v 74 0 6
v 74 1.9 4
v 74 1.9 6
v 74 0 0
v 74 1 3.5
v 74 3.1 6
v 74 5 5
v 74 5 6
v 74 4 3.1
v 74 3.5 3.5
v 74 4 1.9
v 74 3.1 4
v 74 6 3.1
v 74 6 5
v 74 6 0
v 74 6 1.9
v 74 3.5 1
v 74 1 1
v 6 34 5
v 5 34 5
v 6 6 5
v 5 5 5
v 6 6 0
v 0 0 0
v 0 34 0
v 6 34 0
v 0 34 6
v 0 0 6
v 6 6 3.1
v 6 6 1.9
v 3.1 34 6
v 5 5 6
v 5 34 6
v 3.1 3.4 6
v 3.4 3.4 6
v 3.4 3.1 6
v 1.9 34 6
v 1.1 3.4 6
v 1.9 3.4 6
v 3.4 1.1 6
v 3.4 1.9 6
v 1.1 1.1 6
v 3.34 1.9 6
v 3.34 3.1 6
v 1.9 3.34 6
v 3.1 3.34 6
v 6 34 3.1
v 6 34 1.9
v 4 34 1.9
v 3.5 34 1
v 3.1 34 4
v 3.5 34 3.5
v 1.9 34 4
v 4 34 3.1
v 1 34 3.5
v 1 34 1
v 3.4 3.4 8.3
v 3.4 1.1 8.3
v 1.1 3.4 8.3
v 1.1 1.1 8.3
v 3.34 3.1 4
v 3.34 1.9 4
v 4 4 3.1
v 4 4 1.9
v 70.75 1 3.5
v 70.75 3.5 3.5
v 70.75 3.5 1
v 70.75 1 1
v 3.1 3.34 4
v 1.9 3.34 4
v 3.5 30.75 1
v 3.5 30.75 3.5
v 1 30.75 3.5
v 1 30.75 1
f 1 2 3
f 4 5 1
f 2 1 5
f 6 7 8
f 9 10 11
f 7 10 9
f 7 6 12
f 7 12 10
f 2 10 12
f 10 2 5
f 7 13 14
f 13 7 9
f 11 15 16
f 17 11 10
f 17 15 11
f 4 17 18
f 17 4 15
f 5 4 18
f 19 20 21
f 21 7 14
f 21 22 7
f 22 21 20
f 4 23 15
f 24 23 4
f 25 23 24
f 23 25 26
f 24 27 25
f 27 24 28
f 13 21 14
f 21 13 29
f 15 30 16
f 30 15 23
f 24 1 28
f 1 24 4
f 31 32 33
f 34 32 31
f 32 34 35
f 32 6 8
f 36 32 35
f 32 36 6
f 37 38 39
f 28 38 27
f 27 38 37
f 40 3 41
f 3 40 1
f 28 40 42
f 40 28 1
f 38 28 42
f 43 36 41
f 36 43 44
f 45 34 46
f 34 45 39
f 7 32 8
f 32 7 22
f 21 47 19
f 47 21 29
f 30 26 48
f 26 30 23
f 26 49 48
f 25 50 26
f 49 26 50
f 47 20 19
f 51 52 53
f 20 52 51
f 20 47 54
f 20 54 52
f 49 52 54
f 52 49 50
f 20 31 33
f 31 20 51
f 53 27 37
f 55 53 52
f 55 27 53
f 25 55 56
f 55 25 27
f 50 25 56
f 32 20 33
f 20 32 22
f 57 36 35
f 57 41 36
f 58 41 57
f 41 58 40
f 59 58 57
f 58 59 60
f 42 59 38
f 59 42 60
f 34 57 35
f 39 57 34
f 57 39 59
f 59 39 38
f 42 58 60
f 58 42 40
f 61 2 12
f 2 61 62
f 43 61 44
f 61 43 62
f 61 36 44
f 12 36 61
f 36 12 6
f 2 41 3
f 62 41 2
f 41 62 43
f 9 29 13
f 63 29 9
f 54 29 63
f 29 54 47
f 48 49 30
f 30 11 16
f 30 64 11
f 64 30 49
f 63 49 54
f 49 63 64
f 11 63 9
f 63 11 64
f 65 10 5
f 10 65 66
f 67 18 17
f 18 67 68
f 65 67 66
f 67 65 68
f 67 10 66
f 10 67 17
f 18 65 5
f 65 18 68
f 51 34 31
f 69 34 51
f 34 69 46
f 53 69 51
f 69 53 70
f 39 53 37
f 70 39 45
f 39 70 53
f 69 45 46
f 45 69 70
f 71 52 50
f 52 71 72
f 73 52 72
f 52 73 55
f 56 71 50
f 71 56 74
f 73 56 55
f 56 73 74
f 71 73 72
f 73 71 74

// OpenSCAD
//—————————————————————————
//►►► define overall box dimensions ◄◄◄
  box_length = 80;  //total box length
  box_width = 60;   //total box width
  box_height = 40;  //total box height including rim
  cornerL_cross_section = 6; //cross section of corner pcs
  rim_thickness = 6; //thickness (height) of top rim (slot_depth+1 minimum)
//—————————————————————————  
  slot_depth = 2.0;  //be careful changing this (2)
  slot_width = 1.2;  //and this... (1.2)
  slot_width_clearance = .4;  //and this... (.4)
  //panel thickness = slot_width - slot_width_clearance
//—————————————————————————
  feet = 2;  //  2=feet  0=no feet
//feet under larger size bottom panels for support. a larger sized bottom panel will "droop" & possibly come out of the slots if loaded down & unsupported.
//—————————————————————————
//▬▬► NOTES & TIPS AT THE END OF FILE ◄▬▬
//—————————————————————————
//changing these below may adversely affect the fit of various parts...
  clearance1 = .2;   //pin hole
  clearance2 = .75;  //extra pin hole depth clearance
  clearance3 = .1;   //slot depth clearance (each side)
//—————————————————————————

//—————————————————————————
//▼▼↓↓↓ choose part to render ↓↓↓▼▼

//  "cornerL_LxH"      need 2 pcs
//  "cornerL_WxH"      need 2 pcs
//  "top_rim"          need 1 pc
//  "panel_side_LxH"   need 2 pcs
//  "panel_side_WxH"   need 2 pcs
//  "panel_bottom"     need 1 pc

//▲▲↑↑↑ choose part to render ↑↑↑▲▲

//▼▼▼▼▼▼▼▼▼▼▼▼▼▼▼▼▼▼▼▼▼▼▼
  part = "cornerL_LxH";  //◄◄◄ change this ◄◄◄
//▲▲▲▲▲▲▲▲▲▲▲▲▲▲▲▲▲▲▲▲▲▲▲


//—————————————————————————
  square_pin_hole = 2.5;  //cubed (don't change)
  pin_offset = 1.0;  //pin offset from corner (don't change)
//—————————————————————————
  cLcross = cornerL_cross_section;
  cornerL_L = box_length - cLcross;
  cornerL_W = box_width - cLcross;
  cornerL_H = box_height - rim_thickness;
  pin_size = square_pin_hole - clearance1;
  pin_hole_depth = square_pin_hole + clearance2;
  slot_length_L = cornerL_L - cLcross + slot_depth*2;
  slot_length_W = cornerL_W - cLcross + slot_depth*2;
  slot_length_H = cornerL_H - cLcross + slot_depth*2;
  slot_length_rim_L = box_length - pin_size*2 - pin_offset*2;
  slot_length_rim_W = box_width - pin_size*2 - pin_offset*2;
  panel_length = box_length - cLcross*2 + slot_depth*2 - clearance3*2;
  panel_width = box_width - cLcross*2 + slot_depth*2 - clearance3*2;
  panel_height = box_height - cLcross - rim_thickness + slot_depth*2 - clearance3*2;
  extra_length = cLcross*.22;  //rim slot extra length
//—————————————————————————
     
     
//—↓—↓—↓— dont change these —↓—↓—↓—
if(part == "cornerL_LxH") {//  ←↓dont change these
    cornerL_LxH();//  ←↓↑dont change these
} else if(part == "cornerL_WxH") {
    cornerL_WxH();//  ←↓↑dont change
} else if(part == "top_rim") {
    top_rim();//  ←↓↑dont change
} else if(part == "panel_side_LxH") {
    panel_side_LxH();//  ←↓↑dont change
} else if(part == "panel_side_WxH") {
    panel_side_WxH();//  ←↓↑dont change
} else if(part == "panel_bottom") {
    panel_bottom();//  ←↑dont change
}//—↑—↑—↑— dont change these —↑—↑—↑—



//—————————————————————————      
//————corner L length & height————
module cornerL_LxH(){
difference(){
union(){
//box length lower (along X axis)
translate([0,0,0])
   rotate([0,0,0])
      color("MediumPurple") 
         cube([cornerL_L,cLcross,5]);
//box length upper (along X axis)
translate([0,0,0])
   rotate([0,0,0])
      color("MediumPurple") 
         cube([cornerL_L,5,cLcross]);
//box height lower (along Y axis)
translate([0,0,0])
   rotate([0,0,0])
      color("MediumPurple") 
         cube([cLcross,cornerL_H,5]);
//box height upper (along Y axis)
translate([0,0,0])
   rotate([0,0,0])
      color("MediumPurple") 
         cube([5,cornerL_H,cLcross]);
//square pin
translate([pin_offset+clearance1/2,pin_offset+clearance1/2,cLcross])
   rotate([0,0,0])
      color("DarkOrchid") 
         cube([pin_size,pin_size,pin_size]);
}        
//top slot for length (along X axis)
translate([cLcross-slot_depth-extra_length/2,5/2-slot_width/2,cLcross-slot_depth])
   rotate([0,0,0])
      color("Yellow") 
         cube([slot_length_L,slot_width,slot_depth]);
//side slot for length (along X axis)
translate([cLcross-slot_depth,cLcross-slot_depth,5/2-slot_width/2])
   rotate([0,0,0])
      color("Yellow") 
         cube([slot_length_L,slot_depth,slot_width]);
//square pin hole for length end (along X axis)
translate([cornerL_L-square_pin_hole-clearance2,pin_offset,pin_offset])
   rotate([0,0,0])
      color("Goldenrod") 
         cube([pin_hole_depth,square_pin_hole,square_pin_hole]);
//top slot for height (along Y axis)
translate([5/2-slot_width/2,cLcross-slot_depth-extra_length/2,cLcross-slot_depth])
   rotate([0,0,0])
      color("Yellow") 
         cube([slot_width,slot_length_H,slot_depth]);
//side slot for height (along Y axis)
translate([cLcross-slot_depth,cLcross-slot_depth,5/2-slot_width/2])
   rotate([0,0,0])
      color("Yellow") 
         cube([slot_depth,slot_length_H,slot_width]);
//square pin hole for height end (along Y axis)
translate([pin_offset,cornerL_H-square_pin_hole-clearance2,pin_offset])
   rotate([0,0,0])
      color("Goldenrod") 
         cube([square_pin_hole,pin_hole_depth,square_pin_hole]);
     }}
     
    
     
//—————————————————————————
//————corner L width & height————
module cornerL_WxH(){
difference(){
union(){
//box width lower (along X axis)
translate([0,0,0])
   rotate([0,0,0])
      color("Plum") 
         cube([cornerL_W,cLcross,5]);
//box width upper (along X axis)
translate([0,0,0])
   rotate([0,0,0])
      color("Plum") 
         cube([cornerL_W,5,cLcross]);
//box height lower (along Y axis)
translate([0,0,0])
   rotate([0,0,0])
      color("Plum") 
         cube([cLcross,cornerL_H,5]);
//box height upper (along Y axis)
translate([0,0,0])
   rotate([0,0,0])
      color("Plum") 
         cube([5,cornerL_H,cLcross]);
//square pin
translate([pin_offset+clearance1/2,pin_offset+clearance1/2,cLcross])
   rotate([0,0,0])
      color("Orchid") 
         cube([pin_size,pin_size,pin_size]);
}     
//top slot for width (along X axis)
translate([cLcross-slot_depth-extra_length/2,5/2-slot_width/2,cLcross-slot_depth])
   rotate([0,0,0])
      color("Yellow") 
         cube([slot_length_W,slot_width,slot_depth]);
//side slot for width (along X axis)
translate([cLcross-slot_depth,cLcross-slot_depth,5/2-slot_width/2])
   rotate([0,0,0])
      color("Yellow") 
         cube([slot_length_W,slot_depth,slot_width]);
 //square pin hole for width end (along X axis)
translate([cornerL_W-square_pin_hole-clearance2,pin_offset,pin_offset])
   rotate([0,0,0])
      color("Goldenrod") 
         cube([pin_hole_depth,square_pin_hole,square_pin_hole]);
//top slot for height (along Y axis)
translate([5/2-slot_width/2,cLcross-slot_depth-extra_length/2,cLcross-slot_depth])
   rotate([0,0,0])
      color("Yellow") 
         cube([slot_width,slot_length_H,slot_depth]);
//side slot for height (along Y axis)
translate([cLcross-slot_depth,cLcross-slot_depth,5/2-slot_width/2])
   rotate([0,0,0])
      color("Yellow") 
         cube([slot_depth,slot_length_H,slot_width]);
//square pin hole for height end (along Y axis)
translate([pin_offset,cornerL_H-square_pin_hole-clearance2,pin_offset])
   rotate([0,0,0])
      color("Goldenrod") 
         cube([square_pin_hole,pin_hole_depth,square_pin_hole]);
     }}
     
     
     
//—————————————————————————  
//————top rim——————————————
module top_rim(){   
difference(){
union(){
//box length1 (left)
translate([0,0,0])
   rotate([0,0,0])
      color("SlateBlue") 
         cube([5,box_length,rim_thickness]);
//box length2 (right)
translate([box_width-5,0,0])
   rotate([0,0,0])
      color("SlateBlue") 
         cube([5,box_length,rim_thickness]);
//box width1 (lower)
translate([0,0,0])
   rotate([0,0,0])
      color("SlateBlue") 
         cube([box_width,5,rim_thickness]);
//box width2 (upper)
translate([0,box_length-5,0])
   rotate([0,0,0])
      color("SlateBlue") 
         cube([box_width,5,rim_thickness]);
//square pin1 (lower left)
translate([pin_offset+clearance1/2,pin_offset+clearance1/2,rim_thickness])
   rotate([0,0,0])
      color("DarkSlateBlue") 
         cube([pin_size,pin_size,pin_size]);
//square pin2 (lower right)
translate([box_width-pin_size-pin_offset-clearance1/2,pin_offset+clearance1/2,rim_thickness])
   rotate([0,0,0])
      color("DarkSlateBlue") 
         cube([pin_size,pin_size,pin_size]);
//square pin3 (upper left)
translate([pin_offset+clearance1/2,box_length-pin_size-pin_offset-clearance1/2,rim_thickness])
   rotate([0,0,0])
      color("DarkSlateBlue") 
         cube([pin_size,pin_size,pin_size]);
//square pin4 (upper right)
translate([box_width-pin_size-pin_offset-clearance1/2,box_length-pin_size-pin_offset-clearance1/2,rim_thickness])
   rotate([0,0,0])
      color("DarkSlateBlue") 
         cube([pin_size,pin_size,pin_size]);
}        
//top slot for length1 (left)
translate([5/2-slot_width/2,pin_size+pin_offset,rim_thickness-slot_depth])
   rotate([0,0,0])
      color("Yellow") 
         cube([slot_width,slot_length_rim_L,slot_depth]);
//top slot for length2 (right)
translate([box_width-5/2-slot_width/2,pin_size+pin_offset,rim_thickness-slot_depth])
   rotate([0,0,0])
      color("Yellow") 
         cube([slot_width,slot_length_rim_L,slot_depth]);
//top slot for width1 (lower)
translate([pin_size+pin_offset,5/2-slot_width/2,rim_thickness-slot_depth])
   rotate([0,0,0])
      color("Yellow") 
         cube([slot_length_rim_W,slot_width,slot_depth]);
//top slot for width2 (upper)
translate([pin_size+pin_offset,box_length-5/2-slot_width/2,rim_thickness-slot_depth])
   rotate([0,0,0])
      color("Yellow") 
         cube([slot_length_rim_W,slot_width,slot_depth]);
     }}  
     
   
     
//————side panel length & height————
module panel_side_LxH(){   
translate([0,0,0])
   rotate([0,0,0])
      color("YellowGreen") 
      cube([panel_length,panel_height,slot_width-slot_width_clearance]);
}  


//————side panel width & height————
module panel_side_WxH(){   
translate([0,0,0])
   rotate([0,0,0])
      color("MediumSeaGreen") 
      cube([panel_width,panel_height,slot_width-slot_width_clearance]);
} 


//————bottom panel————
module panel_bottom(){   
union(){
translate([0,0,0])
   rotate([0,0,0])
      color("OliveDrab") 
      cube([panel_width,panel_length,slot_width-slot_width_clearance]);
    
//bottom panel foot1 (left)
translate([panel_width*.25,panel_length*.5,slot_width-slot_width_clearance+1])
   rotate([0,0,0])
      color("MediumSeaGreen") 
      cube([panel_width*.15,5,feet],center=true);
//bottom panel foot2 (upper)    
translate([panel_width*.5,panel_length*.75,slot_width-slot_width_clearance+1])
   rotate([0,0,0])
      color("MediumSeaGreen") 
      cube([5,panel_length*.15,feet],center=true);
//bottom panel foot3 (right)
translate([panel_width*.75,panel_length*.5,slot_width-slot_width_clearance+1])
   rotate([0,0,0])
      color("MediumSeaGreen") 
      cube([panel_width*.15,5,feet],center=true);
//bottom panel foot4 (lower)
translate([panel_width*.5,panel_length*.25,slot_width-slot_width_clearance+1])
   rotate([0,0,0])
      color("MediumSeaGreen") 
      cube([5,panel_length*.15,feet],center=true);
}}
//       ↓           ↓
//        ↓         ↓
//         ↓       ↓
//          ↓     ↓
//           ↓   ↓
//            ↓ ↓
//             ↓
//————————————————————————————
//——————— extra notes ————————
//————————————————————————————




// I am a beginner at using this program. There are probably easier ways to do what this file does.





//I use .8mm thick PANELS. My prototype box had .8mm PANELS. Even at my absolute MAX SIZE of 140mm cubed for my printer, .8mm PANELS are good enough. I don't see a reason for me to change it, although this file does allow for thicker PANELS if you want.

//slot_width 1.2 - slot_width_clearance .4 gives you .8mm panel thickness

//I print all parts SOLID (no infill) for strength

//— — — — — — — —

//suggested settings:
//(the BEST settings in my opinion)

  //cornerL_cross_section = 6
  //rim_thickness = 6
  //slot_width = 1.2
  //slot_depth = 2.0
  //slot_width_clearance = .4
  //with feet on bottom panel.

//These settings give you a sturdy strong box with .8mm thick panels. It's kinda hard to remove support material from the slots, but once you do it works great even on large boxes with a heavy load.

//— — — — — — — —

//when changing cornerL cross section & slot width/depth, ensure that slots & square pin holes do not intersect & that enough material is left to print a strong part.


//slot_width_clearance & slot_width affect the thickness of PANELS when rendering
  
  
//clearance3 & slot_depth affect the size of PANELS when rendering
  
//— — — — — — — —

//for a smaller, more delicate box:

  //cornerL_cross_section = 5
  //rim_thickness = 5
  //slot_width = 1.0
  //slot_depth = 1.0
  //slot_width_clearance = .2
  //with or without feet

//A shallower slot suitable for smaller boxes but not suitable for heavy loads. With or without feet on the bottom panel. Panels are .8mm thick.

//PANELS MORE EASILY POP OUT OF THE SLOTS WHEN YOU DON'T WANT THEM TO.

  
  
  
  
